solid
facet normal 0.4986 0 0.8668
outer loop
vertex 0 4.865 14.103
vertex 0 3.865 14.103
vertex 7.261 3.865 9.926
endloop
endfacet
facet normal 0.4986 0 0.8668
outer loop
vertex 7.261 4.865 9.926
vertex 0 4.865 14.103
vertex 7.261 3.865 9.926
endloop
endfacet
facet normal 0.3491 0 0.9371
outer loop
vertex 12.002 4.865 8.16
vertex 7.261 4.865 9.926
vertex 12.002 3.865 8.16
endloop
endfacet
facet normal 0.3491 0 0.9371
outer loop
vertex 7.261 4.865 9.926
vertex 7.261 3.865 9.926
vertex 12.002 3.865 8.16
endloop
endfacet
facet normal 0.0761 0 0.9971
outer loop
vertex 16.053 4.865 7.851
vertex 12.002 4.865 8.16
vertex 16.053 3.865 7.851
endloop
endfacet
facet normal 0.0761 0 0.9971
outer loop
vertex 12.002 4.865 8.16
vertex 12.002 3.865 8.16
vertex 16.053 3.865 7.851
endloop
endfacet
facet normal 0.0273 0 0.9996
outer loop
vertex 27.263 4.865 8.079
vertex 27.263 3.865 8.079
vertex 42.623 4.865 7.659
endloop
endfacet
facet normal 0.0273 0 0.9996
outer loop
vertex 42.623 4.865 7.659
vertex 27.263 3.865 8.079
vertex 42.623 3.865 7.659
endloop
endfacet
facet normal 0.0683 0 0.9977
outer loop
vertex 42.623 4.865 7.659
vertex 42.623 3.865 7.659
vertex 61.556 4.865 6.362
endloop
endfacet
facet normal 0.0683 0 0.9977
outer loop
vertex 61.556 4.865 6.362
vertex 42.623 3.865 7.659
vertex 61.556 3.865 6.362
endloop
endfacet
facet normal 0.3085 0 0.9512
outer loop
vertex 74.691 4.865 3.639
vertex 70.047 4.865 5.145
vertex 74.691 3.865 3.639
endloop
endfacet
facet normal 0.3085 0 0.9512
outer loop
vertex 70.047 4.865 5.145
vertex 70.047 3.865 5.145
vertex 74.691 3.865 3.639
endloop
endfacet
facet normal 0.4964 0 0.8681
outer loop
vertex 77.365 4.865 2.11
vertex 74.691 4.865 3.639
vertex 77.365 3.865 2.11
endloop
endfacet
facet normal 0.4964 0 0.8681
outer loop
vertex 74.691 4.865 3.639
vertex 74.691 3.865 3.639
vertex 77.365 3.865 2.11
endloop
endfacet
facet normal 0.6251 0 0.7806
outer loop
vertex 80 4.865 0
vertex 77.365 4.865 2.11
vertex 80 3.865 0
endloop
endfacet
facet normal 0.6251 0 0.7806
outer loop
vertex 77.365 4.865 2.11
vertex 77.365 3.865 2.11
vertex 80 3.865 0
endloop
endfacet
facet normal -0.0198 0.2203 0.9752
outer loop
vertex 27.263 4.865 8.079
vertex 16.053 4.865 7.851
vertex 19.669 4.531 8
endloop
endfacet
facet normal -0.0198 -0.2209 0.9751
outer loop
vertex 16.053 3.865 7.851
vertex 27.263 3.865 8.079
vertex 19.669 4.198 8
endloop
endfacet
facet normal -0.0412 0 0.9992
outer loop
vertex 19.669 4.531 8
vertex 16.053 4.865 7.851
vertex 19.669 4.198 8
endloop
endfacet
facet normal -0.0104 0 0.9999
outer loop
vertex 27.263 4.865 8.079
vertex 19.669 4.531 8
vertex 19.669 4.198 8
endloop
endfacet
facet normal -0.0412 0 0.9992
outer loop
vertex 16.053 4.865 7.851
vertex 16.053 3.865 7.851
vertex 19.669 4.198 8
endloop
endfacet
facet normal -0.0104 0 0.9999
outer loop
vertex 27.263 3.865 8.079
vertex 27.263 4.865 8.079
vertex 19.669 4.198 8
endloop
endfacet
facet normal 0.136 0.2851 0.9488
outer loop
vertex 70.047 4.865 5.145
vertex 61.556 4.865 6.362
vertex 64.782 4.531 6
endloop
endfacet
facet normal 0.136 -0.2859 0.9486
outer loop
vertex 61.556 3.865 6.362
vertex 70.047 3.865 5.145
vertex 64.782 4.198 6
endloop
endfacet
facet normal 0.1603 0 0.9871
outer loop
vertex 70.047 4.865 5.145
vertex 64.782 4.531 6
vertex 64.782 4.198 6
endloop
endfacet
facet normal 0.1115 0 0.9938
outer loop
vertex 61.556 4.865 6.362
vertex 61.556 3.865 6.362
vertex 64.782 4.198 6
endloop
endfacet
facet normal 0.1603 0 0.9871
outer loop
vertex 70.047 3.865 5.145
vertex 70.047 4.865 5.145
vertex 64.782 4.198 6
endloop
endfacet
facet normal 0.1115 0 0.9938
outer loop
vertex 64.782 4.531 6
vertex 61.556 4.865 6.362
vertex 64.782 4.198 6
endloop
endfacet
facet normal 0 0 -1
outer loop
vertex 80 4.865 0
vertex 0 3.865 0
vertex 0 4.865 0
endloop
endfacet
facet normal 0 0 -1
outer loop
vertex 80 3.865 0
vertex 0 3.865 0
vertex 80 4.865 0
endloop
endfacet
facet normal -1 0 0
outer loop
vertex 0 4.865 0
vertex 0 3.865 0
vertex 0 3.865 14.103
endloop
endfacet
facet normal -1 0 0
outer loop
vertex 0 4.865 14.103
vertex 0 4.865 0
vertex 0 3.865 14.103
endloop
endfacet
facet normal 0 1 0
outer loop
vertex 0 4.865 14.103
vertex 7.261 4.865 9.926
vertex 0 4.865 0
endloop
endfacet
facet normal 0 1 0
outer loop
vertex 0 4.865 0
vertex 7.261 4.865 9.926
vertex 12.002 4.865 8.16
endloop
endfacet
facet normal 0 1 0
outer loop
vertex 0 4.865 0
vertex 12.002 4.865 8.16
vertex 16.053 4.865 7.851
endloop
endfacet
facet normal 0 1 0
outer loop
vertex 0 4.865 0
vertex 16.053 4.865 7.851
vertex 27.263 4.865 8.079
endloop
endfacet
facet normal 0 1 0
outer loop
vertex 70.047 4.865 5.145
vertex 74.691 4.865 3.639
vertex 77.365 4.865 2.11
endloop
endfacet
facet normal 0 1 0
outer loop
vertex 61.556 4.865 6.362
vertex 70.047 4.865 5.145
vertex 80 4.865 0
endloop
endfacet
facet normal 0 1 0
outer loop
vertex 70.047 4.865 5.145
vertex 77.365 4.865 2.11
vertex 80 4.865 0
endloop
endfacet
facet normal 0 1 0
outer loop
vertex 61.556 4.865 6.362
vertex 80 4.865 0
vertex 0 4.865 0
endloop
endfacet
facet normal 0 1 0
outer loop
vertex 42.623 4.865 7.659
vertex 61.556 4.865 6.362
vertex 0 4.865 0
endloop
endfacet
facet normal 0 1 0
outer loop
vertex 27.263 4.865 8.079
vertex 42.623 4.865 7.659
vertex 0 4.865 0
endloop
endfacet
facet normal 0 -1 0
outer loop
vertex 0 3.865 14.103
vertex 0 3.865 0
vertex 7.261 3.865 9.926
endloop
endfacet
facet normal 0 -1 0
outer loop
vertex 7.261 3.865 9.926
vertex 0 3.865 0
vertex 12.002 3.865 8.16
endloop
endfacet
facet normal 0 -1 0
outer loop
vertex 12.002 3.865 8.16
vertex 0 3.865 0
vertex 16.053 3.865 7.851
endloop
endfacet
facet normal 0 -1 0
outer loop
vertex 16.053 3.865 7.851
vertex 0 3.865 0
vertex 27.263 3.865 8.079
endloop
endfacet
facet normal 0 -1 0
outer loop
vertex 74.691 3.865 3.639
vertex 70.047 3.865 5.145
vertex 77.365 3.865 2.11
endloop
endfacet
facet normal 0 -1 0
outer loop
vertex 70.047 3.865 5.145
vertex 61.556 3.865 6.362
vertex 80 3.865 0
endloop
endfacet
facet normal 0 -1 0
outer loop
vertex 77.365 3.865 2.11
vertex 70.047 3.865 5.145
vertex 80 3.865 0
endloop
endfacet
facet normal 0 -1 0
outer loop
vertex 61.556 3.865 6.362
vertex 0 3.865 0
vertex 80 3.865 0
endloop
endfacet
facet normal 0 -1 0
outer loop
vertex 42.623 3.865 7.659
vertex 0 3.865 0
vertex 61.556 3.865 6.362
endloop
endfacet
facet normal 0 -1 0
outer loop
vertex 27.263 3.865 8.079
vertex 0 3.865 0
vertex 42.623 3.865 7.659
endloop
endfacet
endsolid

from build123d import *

# Parameters (mm, degrees)
F0_W     = 80
F0_H     = 15
F1_DEPTH = 10
F3_DEPTH = 80
F5_DEPTH = 1


# Not quite as in the source:
# - a feature names something its author has since deleted; it is built from what else it names


with BuildPart() as f1:
    # F0 (on Front) → F1 (new body)
    with BuildSketch(Plane.XZ):
        with Locations((40, 7.5)):
            Rectangle(F0_W, F0_H)
    extrude(amount=-F1_DEPTH)

    # F2 (on face) → F3 (cut, through all)
    with BuildSketch(Plane.YZ.offset(80)):
        Polygon((0, 0), (3.8646364119, 0), (3.8646364119, 14.1026135534), (4.8646364119, 14.1026135534), (4.8646364119, 0), (10, 0), (10, 15), (0, 15), align=None)
    extrude(amount=-F3_DEPTH, mode=Mode.SUBTRACT)

    # F4 (on face) → F5 (cut, through all)
    with BuildSketch(Plane.XZ.offset(-3.8646364119)):
        with BuildLine():
            Line((80, 14.1026135534), (0, 14.1026135534))
            add(Edge.make_bspline(
                [(0, 14.1026135534), (11.4500320441, 6.9391493751), (14.6371912, 8.9491259409), (66.2321012405, 7.0001102922), (75.6593212739, 3.937227071), (80, 0)],
                knots=[0, 0, 0, 0, 0.2965600092, 0.7356986957, 1, 1, 1, 1], degree=3))
            Line((80, 0), (80, 14.1026135534))
        make_face()
    extrude(amount=-F5_DEPTH, mode=Mode.SUBTRACT)


solid = f1.part
